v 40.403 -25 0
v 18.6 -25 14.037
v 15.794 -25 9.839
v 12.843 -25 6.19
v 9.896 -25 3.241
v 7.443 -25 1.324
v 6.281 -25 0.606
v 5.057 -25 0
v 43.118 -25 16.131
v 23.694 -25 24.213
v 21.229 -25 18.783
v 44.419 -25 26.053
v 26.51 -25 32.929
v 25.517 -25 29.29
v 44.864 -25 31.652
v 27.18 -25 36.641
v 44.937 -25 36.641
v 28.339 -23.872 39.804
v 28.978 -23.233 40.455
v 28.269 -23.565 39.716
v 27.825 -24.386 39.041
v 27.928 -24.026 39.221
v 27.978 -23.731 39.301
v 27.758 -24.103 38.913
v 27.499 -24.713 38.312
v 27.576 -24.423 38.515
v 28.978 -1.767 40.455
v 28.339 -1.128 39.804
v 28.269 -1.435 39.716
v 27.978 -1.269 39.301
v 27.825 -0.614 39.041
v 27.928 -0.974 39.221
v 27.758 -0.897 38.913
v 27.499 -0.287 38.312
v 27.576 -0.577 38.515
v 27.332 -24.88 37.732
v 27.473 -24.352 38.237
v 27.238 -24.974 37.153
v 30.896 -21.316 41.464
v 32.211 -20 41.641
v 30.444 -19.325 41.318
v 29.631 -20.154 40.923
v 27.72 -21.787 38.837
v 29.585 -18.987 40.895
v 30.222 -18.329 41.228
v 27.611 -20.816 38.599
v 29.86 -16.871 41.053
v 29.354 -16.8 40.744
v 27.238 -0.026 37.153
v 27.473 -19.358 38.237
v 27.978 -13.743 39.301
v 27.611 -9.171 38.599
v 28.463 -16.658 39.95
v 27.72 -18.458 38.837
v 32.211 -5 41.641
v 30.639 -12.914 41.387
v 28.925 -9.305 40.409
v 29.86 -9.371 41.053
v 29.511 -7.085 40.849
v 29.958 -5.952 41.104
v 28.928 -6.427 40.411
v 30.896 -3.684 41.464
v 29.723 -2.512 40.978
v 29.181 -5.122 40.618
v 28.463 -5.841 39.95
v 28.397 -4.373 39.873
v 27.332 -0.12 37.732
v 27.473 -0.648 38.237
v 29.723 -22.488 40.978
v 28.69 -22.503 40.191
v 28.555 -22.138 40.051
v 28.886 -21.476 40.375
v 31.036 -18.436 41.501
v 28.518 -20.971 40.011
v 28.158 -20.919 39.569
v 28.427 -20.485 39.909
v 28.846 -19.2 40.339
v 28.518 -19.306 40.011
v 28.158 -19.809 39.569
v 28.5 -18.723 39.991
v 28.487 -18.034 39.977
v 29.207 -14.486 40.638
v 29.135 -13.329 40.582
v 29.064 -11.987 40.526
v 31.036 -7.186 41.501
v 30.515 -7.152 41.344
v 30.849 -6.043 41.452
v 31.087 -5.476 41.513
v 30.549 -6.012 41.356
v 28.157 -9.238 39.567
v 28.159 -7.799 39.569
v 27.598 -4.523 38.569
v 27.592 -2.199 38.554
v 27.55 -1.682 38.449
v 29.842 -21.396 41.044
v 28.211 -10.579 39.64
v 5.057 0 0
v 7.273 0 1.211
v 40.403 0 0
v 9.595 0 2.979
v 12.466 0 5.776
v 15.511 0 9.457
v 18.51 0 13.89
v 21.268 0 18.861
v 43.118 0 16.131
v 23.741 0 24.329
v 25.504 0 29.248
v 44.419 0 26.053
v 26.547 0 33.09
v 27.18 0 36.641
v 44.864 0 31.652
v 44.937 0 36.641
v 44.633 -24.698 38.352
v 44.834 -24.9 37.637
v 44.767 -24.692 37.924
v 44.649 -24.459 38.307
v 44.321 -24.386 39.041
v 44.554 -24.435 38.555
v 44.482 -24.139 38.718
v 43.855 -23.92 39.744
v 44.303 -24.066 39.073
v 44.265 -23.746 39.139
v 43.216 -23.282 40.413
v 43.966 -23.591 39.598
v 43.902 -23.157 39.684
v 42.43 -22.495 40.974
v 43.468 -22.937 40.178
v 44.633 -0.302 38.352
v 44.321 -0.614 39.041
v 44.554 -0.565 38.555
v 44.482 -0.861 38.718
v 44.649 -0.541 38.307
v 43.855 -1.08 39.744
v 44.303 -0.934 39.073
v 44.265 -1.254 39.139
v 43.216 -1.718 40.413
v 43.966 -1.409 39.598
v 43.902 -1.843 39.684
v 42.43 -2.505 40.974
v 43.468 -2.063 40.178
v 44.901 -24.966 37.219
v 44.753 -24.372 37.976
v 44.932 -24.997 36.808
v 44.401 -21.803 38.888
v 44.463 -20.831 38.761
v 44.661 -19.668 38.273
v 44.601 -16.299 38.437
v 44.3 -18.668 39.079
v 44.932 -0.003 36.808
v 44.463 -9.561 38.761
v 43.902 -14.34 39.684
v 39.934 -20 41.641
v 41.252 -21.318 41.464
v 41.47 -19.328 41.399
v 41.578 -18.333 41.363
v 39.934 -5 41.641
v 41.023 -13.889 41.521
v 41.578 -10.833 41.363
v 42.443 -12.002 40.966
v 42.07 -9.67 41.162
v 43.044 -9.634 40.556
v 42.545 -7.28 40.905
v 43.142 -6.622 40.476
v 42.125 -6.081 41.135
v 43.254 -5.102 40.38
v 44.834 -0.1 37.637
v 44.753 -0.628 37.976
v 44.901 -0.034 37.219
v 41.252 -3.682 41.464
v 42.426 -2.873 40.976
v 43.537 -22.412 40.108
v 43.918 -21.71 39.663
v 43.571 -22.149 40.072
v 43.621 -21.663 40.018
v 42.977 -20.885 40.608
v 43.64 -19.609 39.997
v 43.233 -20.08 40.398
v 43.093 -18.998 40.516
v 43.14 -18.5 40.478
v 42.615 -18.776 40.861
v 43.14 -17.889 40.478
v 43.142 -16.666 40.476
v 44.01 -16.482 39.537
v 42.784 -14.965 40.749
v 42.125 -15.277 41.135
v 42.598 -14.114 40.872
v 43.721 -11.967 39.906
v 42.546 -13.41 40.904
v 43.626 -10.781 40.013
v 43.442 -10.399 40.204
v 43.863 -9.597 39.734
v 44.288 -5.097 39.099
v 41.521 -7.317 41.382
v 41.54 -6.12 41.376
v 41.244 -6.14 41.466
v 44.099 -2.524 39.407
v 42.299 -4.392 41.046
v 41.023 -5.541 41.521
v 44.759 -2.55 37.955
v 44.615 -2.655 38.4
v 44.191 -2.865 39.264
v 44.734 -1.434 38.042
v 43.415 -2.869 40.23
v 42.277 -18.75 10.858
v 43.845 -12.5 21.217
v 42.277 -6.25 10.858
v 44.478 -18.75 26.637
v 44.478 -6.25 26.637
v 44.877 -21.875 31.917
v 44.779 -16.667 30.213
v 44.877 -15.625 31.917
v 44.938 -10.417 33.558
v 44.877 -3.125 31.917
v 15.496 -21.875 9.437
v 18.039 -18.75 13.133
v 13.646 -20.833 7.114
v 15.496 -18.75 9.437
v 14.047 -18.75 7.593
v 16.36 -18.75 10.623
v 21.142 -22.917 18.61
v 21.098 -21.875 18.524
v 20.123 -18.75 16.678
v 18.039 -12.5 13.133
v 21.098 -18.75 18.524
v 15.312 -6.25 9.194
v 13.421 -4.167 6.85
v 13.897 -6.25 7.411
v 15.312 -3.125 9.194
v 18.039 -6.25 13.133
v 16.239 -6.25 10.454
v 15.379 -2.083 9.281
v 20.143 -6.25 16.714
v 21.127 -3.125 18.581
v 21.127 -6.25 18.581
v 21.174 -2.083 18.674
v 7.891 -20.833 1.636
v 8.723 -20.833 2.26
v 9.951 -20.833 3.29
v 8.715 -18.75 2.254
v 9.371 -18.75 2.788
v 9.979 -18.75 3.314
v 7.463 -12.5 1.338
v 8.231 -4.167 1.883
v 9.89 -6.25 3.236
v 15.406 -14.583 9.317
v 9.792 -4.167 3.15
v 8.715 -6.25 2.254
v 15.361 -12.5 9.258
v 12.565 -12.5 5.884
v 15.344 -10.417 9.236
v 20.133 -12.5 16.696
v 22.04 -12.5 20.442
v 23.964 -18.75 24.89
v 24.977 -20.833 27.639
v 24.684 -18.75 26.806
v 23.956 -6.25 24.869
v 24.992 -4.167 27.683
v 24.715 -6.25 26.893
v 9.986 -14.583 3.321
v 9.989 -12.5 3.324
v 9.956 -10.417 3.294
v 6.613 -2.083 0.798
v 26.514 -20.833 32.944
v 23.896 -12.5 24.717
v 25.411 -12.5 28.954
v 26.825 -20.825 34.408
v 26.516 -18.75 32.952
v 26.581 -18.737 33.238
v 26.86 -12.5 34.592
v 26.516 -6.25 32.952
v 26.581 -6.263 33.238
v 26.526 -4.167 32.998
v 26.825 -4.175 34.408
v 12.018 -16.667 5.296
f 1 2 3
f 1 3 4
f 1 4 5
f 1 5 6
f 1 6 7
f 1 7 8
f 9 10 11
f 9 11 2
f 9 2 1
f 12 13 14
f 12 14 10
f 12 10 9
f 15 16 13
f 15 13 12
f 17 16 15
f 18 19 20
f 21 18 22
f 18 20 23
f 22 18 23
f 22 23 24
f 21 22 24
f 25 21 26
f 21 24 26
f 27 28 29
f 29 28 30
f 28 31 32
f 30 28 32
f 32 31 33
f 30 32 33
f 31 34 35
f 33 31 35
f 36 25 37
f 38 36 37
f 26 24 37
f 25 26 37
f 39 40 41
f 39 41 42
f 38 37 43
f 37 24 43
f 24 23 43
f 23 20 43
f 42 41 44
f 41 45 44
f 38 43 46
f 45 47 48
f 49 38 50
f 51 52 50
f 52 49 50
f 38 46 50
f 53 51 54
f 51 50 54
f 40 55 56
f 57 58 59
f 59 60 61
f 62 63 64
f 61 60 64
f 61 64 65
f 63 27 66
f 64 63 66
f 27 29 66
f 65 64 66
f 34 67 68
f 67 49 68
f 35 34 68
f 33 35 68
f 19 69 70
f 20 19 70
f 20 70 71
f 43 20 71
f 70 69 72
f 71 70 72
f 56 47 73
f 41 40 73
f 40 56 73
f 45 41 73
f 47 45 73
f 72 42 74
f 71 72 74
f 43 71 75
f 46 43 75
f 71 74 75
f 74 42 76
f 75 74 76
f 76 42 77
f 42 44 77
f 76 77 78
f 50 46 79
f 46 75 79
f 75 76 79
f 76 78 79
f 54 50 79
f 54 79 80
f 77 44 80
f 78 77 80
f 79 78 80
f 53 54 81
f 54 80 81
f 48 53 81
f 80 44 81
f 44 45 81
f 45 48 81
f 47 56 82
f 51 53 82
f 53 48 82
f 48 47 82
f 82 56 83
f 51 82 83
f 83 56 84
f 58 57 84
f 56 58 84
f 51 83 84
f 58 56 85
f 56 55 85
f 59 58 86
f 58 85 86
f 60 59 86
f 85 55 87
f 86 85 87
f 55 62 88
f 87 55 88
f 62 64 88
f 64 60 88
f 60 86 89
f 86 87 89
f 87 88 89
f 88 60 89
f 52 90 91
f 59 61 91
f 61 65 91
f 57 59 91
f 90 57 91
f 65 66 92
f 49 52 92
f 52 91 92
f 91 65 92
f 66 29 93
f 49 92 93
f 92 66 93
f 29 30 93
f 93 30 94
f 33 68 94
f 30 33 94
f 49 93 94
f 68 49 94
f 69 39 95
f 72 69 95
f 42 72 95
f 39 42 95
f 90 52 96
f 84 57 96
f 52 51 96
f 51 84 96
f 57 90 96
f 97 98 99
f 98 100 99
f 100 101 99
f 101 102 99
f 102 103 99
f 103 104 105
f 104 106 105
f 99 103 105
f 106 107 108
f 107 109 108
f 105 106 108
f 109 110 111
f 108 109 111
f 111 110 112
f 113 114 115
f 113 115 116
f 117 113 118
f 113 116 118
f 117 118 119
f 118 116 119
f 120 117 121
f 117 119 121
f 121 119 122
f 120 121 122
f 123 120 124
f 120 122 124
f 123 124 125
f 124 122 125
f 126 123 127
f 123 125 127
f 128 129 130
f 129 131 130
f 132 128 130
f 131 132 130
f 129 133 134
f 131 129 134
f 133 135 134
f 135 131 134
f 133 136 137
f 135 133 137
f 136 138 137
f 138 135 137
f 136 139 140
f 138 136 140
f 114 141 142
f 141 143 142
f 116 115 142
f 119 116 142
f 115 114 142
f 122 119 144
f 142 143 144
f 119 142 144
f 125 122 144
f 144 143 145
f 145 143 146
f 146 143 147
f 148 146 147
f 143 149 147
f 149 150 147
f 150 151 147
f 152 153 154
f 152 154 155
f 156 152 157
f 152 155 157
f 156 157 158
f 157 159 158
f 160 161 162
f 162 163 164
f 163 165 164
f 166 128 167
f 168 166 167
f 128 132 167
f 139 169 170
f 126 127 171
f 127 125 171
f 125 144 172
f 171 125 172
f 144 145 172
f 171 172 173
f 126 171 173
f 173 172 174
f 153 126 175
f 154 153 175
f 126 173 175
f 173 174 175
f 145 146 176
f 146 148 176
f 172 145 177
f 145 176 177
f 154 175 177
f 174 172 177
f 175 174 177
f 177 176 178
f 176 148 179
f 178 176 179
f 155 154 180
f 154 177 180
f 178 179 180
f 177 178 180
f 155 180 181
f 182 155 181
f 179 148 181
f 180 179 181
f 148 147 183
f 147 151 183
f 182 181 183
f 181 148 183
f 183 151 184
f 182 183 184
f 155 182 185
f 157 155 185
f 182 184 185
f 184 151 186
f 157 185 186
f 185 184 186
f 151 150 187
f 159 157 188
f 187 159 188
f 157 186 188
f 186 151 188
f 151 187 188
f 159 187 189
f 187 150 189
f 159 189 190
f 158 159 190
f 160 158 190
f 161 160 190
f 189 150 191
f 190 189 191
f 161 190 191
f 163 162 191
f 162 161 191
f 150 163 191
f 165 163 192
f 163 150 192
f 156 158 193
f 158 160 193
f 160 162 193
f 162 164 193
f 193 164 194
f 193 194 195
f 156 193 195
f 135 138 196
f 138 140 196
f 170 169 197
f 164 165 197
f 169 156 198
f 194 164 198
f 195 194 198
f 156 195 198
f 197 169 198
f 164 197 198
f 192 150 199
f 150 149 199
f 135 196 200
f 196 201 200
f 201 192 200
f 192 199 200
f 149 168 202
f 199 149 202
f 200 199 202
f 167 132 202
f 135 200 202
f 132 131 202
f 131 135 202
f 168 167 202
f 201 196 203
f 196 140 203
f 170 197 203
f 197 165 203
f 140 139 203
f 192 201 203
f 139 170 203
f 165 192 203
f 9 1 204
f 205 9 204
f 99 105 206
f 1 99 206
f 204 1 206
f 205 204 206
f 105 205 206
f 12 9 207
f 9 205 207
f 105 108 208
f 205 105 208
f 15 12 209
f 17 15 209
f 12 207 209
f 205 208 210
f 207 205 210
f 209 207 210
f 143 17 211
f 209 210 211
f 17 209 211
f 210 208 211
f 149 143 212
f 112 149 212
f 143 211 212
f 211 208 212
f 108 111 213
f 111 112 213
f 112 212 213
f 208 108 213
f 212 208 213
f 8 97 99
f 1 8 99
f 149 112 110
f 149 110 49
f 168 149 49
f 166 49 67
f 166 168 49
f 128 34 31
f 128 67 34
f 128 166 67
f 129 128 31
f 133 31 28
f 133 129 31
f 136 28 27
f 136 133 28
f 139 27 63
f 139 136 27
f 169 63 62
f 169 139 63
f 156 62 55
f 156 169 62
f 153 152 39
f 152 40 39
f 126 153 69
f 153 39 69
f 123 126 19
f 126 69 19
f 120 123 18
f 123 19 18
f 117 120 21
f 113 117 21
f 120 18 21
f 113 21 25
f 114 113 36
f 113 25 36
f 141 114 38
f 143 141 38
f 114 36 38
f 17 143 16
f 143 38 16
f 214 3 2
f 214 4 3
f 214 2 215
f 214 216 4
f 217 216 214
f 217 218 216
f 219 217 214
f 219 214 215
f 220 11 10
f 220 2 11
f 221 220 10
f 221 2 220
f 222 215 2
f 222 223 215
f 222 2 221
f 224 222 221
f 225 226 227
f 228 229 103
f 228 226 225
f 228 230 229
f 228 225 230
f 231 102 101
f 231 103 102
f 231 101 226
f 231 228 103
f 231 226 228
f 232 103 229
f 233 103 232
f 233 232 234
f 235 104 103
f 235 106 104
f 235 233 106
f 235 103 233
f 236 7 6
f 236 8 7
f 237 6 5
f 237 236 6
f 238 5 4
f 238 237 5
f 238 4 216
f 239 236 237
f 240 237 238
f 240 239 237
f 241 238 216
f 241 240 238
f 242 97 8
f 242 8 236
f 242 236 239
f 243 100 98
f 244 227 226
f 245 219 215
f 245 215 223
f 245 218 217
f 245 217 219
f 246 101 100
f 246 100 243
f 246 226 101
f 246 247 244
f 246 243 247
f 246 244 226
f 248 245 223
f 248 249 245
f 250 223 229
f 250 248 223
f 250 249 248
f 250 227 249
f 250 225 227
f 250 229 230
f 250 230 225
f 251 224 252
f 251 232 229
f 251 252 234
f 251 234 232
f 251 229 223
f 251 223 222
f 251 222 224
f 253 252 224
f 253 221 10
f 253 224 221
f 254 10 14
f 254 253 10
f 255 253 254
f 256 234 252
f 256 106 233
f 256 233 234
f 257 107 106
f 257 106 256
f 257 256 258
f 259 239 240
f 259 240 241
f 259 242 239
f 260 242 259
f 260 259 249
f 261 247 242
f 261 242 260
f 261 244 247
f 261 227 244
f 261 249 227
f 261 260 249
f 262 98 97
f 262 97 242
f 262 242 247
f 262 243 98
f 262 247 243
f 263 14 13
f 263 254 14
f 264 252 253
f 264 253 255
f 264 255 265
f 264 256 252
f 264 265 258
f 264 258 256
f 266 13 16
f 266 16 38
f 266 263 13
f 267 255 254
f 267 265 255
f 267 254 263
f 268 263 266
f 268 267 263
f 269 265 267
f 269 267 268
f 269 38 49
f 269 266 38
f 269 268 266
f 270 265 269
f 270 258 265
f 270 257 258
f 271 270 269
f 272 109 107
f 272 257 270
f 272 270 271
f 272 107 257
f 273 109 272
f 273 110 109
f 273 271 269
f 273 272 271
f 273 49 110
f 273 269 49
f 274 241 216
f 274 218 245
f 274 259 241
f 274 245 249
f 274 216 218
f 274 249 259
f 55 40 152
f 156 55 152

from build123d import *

# Parameters (mm, degrees)
F1_DEPTH = 25
F3_DEPTH = 52.7
F4_W     = 21.8509435654
F4_H     = 7.5018182397
F5_DEPTH = 59
F6_R     = 5


with BuildPart() as f1:
    # F0 (on Front) → F1 (new body)
    with BuildSketch(Plane.XZ):
        with BuildLine():
            add(Edge.make_bspline(
                [(40.403097868, 0), (44.3484185144, 22.4320712328), (51.8048986631, 64.8276858948), (2.8348392211, 27.1599391862), (0.8974329238, 8.5980973641), (0, 0)],
                knots=[0, 0, 0, 0, 0.3762323348, 0.7110623413, 1, 1, 1, 1], degree=3))
            Line((0, 0), (40.403097868, 0))
        make_face()
    extrude(amount=F1_DEPTH)

    # F2 (on Front) → F3 (cut)
    with BuildSketch(Plane.XZ):
        with BuildLine():
            add(Edge.make_bspline(
                [(0, 0), (4.1592267834, -2.743001842), (21.4151895882, 11.1218512251), (34.6891976083, 56.5742371109), (-4.672707747, 33.2384640146), (-4.8227010914, 3.1805618367), (0, 0)],
                knots=[0, 0, 0, 0, 0.222731211, 0.4925572792, 0.7417390034, 1, 1, 1, 1], degree=3))
        make_face()
    extrude(amount=F3_DEPTH, mode=Mode.SUBTRACT)

    # F4 (on Front) → F5 (cut)
    with BuildSketch(Plane.XZ):
        with Locations((36.8840396404, 45.3916192055)):
            Rectangle(F4_W, F4_H)
    extrude(amount=F5_DEPTH, mode=Mode.SUBTRACT)

    # F6
    f6_edges = [f1.edges().sort_by_distance(p)[0] for p in [
        (27.179604, -12.5, 41.64071),
        (35.804492, -25, 41.64071),
        (35.804492, 0, 41.64071),
        (44.42938, -12.5, 41.64071),
    ]]
    fillet(f6_edges, radius=F6_R)


solid = f1.part
